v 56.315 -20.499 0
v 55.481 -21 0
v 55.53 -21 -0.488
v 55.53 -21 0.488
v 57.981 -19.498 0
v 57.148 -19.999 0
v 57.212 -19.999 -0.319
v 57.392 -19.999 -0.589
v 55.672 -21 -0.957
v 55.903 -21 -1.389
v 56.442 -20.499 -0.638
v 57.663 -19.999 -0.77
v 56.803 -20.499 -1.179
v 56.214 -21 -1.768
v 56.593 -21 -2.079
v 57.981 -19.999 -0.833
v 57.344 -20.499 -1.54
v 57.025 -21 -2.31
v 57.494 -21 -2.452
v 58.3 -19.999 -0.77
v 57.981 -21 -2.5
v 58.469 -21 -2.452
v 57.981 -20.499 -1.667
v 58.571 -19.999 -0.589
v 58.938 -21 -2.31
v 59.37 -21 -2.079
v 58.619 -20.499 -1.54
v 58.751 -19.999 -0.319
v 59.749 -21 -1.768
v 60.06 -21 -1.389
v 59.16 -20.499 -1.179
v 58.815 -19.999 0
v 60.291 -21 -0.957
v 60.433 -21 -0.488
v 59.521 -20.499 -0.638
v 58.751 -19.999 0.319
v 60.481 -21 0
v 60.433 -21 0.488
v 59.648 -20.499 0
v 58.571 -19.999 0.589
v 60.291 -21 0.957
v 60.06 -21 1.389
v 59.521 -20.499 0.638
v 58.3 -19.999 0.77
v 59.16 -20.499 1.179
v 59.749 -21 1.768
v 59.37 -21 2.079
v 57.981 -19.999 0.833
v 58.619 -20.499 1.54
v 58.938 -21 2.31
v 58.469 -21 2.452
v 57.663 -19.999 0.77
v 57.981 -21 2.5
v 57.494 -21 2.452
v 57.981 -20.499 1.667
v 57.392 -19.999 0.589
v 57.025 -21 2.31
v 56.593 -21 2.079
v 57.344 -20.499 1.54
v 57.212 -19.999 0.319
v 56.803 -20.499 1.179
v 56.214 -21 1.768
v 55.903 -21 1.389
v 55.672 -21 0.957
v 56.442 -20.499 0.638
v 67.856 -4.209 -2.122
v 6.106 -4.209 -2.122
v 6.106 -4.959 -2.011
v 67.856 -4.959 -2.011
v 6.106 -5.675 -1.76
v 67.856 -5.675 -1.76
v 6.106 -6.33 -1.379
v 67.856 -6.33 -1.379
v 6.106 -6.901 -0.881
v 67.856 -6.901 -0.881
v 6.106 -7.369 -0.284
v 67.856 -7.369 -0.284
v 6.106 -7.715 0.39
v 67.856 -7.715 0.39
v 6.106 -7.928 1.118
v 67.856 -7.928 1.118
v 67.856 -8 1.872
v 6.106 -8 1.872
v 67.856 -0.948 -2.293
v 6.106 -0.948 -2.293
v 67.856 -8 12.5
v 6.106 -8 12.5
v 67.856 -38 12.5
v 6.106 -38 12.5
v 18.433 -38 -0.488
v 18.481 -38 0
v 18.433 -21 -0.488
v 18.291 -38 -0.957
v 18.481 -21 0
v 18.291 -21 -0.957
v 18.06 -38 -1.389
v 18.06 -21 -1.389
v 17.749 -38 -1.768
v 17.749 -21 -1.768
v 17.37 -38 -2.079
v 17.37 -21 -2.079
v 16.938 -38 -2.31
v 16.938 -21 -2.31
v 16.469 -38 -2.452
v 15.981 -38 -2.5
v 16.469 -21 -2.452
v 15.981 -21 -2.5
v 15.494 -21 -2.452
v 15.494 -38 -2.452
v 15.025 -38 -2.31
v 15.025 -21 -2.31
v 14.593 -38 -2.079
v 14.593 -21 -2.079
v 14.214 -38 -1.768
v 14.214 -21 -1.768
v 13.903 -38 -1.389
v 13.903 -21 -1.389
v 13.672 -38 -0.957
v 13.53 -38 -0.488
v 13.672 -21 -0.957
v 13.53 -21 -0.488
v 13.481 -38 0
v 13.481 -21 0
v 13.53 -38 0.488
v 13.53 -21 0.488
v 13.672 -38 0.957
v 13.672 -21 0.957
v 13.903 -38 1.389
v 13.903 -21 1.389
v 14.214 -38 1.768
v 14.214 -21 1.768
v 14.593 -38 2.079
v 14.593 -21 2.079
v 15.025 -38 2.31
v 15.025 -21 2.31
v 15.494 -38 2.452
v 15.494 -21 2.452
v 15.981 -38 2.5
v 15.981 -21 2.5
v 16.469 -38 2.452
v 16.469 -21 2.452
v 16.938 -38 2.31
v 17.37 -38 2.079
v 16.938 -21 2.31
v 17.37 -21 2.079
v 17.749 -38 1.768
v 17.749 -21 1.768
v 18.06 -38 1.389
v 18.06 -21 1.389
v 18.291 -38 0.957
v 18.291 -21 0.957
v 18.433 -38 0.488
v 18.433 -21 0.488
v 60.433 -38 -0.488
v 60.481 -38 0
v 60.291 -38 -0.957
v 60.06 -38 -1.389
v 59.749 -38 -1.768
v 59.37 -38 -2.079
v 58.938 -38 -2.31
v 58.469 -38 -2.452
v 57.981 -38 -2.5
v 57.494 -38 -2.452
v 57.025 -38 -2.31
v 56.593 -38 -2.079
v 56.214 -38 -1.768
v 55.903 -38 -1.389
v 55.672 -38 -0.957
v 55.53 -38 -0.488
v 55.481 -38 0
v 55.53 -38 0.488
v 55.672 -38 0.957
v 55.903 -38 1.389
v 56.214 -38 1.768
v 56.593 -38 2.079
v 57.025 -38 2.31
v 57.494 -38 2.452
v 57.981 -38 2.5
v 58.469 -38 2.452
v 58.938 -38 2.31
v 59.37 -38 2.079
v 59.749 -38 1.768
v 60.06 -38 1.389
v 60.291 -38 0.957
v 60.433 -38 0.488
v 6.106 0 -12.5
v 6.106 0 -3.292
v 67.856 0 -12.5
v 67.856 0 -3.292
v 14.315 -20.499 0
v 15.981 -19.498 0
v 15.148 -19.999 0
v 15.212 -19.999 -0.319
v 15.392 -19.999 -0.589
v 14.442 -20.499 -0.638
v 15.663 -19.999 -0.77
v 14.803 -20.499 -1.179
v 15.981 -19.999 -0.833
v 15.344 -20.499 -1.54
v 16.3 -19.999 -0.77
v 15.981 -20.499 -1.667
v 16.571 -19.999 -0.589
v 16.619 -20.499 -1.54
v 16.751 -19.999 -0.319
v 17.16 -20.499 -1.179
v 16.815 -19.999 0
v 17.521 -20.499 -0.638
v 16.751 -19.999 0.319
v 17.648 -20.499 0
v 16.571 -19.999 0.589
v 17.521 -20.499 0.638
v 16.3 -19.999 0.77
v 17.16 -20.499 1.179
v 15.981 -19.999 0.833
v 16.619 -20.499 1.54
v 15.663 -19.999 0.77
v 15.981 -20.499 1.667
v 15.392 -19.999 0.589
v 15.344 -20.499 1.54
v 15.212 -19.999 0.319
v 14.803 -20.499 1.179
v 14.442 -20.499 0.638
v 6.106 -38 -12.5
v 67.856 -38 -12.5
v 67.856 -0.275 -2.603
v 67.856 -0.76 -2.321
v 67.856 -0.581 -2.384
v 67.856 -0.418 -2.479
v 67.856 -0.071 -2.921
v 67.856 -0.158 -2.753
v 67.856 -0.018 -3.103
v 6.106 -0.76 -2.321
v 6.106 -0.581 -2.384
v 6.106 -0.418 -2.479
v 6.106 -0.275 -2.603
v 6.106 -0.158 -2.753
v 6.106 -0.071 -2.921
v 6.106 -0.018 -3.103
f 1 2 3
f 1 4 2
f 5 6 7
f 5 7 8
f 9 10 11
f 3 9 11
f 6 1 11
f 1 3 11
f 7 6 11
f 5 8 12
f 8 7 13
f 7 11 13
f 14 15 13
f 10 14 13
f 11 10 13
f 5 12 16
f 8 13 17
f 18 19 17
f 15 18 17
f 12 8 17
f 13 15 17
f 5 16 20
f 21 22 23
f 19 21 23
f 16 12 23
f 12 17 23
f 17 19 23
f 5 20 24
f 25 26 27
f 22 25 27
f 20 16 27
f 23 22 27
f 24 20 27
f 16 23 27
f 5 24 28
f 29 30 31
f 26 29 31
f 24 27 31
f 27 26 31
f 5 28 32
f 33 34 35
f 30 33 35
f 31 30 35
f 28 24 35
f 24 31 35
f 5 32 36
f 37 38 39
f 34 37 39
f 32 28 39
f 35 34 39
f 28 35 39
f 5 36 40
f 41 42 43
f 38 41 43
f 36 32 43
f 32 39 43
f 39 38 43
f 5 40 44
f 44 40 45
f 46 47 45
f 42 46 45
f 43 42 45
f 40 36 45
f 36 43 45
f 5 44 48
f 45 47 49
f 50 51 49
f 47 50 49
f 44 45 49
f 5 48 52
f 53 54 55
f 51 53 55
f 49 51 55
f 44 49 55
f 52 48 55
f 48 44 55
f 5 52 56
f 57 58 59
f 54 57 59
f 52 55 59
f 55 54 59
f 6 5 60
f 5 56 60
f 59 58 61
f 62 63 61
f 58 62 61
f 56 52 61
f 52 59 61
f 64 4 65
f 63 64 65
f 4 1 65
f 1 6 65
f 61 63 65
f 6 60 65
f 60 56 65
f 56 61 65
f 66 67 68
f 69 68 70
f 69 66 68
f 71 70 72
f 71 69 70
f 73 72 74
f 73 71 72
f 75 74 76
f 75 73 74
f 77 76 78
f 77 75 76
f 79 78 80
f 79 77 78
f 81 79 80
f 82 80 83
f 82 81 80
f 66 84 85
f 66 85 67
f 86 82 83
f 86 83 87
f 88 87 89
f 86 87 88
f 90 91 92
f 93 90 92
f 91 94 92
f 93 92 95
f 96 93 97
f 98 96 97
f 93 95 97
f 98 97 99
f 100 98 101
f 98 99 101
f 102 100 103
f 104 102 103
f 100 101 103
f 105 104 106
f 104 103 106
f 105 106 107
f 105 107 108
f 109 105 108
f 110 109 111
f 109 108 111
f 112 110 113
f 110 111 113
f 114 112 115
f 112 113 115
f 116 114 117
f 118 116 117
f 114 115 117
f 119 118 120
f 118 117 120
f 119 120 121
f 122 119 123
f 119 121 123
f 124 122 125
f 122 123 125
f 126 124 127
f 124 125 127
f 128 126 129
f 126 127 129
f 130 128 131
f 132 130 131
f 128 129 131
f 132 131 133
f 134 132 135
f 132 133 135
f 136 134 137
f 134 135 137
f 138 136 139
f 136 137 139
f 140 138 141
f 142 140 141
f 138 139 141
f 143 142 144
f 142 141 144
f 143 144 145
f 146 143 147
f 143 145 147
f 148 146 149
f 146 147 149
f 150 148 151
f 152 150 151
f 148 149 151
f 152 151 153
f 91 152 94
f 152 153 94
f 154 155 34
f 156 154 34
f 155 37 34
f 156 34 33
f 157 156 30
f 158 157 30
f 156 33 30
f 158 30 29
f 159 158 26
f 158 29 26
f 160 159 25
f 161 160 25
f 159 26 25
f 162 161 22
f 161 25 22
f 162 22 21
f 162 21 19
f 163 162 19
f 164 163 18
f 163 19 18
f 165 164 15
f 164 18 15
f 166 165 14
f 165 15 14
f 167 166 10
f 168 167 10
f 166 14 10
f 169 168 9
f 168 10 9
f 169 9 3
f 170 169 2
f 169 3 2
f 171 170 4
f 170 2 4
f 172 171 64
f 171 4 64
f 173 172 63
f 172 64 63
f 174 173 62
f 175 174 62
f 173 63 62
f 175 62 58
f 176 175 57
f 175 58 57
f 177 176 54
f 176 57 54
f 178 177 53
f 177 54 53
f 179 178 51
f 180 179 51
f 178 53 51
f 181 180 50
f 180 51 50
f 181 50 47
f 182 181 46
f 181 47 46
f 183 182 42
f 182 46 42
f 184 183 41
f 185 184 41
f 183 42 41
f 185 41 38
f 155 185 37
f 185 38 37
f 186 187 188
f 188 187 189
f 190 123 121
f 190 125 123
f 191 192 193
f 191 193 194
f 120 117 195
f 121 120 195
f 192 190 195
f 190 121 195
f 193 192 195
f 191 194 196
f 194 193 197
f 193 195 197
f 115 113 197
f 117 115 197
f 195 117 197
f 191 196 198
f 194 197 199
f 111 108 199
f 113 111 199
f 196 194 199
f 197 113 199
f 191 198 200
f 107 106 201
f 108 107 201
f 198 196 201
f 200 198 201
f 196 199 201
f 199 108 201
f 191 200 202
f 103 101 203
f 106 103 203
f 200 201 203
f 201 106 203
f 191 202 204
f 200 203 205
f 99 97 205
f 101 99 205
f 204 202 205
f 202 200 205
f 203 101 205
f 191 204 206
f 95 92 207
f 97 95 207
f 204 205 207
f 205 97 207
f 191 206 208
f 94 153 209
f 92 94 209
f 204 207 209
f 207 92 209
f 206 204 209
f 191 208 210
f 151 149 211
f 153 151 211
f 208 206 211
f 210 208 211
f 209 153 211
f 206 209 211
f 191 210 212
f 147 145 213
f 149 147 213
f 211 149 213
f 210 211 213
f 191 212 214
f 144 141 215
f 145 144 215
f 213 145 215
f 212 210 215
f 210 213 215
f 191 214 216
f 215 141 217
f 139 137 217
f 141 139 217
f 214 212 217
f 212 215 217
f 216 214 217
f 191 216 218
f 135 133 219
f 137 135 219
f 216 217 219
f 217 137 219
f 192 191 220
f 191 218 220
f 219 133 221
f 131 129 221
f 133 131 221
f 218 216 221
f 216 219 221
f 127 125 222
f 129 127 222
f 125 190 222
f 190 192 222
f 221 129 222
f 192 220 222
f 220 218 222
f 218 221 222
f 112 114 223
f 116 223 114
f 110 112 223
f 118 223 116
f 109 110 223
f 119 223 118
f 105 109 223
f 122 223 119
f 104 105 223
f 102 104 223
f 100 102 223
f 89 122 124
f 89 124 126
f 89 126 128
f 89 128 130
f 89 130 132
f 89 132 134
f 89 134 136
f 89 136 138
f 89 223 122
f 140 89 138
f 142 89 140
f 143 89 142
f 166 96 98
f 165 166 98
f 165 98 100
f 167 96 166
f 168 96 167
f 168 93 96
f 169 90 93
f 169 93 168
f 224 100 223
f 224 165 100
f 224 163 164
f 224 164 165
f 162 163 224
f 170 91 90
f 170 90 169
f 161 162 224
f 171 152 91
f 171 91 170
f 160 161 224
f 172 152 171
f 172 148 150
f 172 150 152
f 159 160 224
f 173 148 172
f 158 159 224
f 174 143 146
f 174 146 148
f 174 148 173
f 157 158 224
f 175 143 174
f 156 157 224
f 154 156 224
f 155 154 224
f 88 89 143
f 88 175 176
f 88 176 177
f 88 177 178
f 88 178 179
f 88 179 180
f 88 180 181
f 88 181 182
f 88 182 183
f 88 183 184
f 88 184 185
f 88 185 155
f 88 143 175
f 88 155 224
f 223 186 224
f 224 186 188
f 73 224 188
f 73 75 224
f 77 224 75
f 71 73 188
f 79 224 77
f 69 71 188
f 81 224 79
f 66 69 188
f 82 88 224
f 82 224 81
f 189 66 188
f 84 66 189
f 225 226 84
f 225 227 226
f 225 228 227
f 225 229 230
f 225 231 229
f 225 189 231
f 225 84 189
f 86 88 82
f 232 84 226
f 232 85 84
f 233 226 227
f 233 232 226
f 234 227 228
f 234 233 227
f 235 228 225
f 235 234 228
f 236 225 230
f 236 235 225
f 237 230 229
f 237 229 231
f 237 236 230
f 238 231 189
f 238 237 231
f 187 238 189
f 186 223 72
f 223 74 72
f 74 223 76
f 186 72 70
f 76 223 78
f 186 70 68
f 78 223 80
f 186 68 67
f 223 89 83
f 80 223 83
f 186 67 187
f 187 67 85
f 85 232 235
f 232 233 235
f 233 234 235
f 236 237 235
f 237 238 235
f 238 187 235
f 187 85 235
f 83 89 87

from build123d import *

# Parameters (mm, degrees)
SKETCH1_W             = 61.75
SKETCH1_H             = 38
BOSS_EXTRUDE1_DEPTH   = 12.5
CUT_EXTRUDE1_REACH    = 75.575
FILLET1_R             = 1
M6_TAPPED_HOLE1_D     = 5
M6_TAPPED_HOLE1_DEPTH = 17
M6_TAPPED_HOLE1_TIP   = 1.502151548


with BuildPart() as part:
    # Sketch1 → Boss-Extrude1 (new, symmetric)
    with BuildSketch(Plane.XY):
        with Locations((36.981465557, -19)):
            Rectangle(SKETCH1_W, SKETCH1_H)
    extrude(amount=BOSS_EXTRUDE1_DEPTH, both=True)

    # Sketch2 → Cut-Extrude1 (cut, up to next)
    with BuildSketch(Plane(origin=(67.856465557, 0, 0), x_dir=(0, 0, -1), z_dir=(1, 0, 0)), mode=Mode.PRIVATE) as cut_extrude1_sk1:
        with BuildLine():
            Line((2.342754418, 0), (2.122152056, -4.209343825))
            ThreePointArc((2.122152056, -4.209343825), (0.88105222, -6.901497484), (-1.872366083, -8))
            Line((-1.872366083, -8), (-12.5, -8))
            Line((-12.5, -8), (-12.5, 0))
            Line((-12.5, 0), (2.342754418, 0))
        make_face()
    cut_extrude1_tool1 = extrude(cut_extrude1_sk1.sketch, amount=-CUT_EXTRUDE1_REACH, mode=Mode.PRIVATE) & part.part
    add(cut_extrude1_tool1.solids().sort_by_distance((67.856466, -3.896267, 5.35091))[0], mode=Mode.SUBTRACT)

    # Fillet1
    fillet1_edges = [part.edges().sort_by_distance(p)[0] for p in [
        (36.981465557, 0, -2.342754418),
    ]]
    fillet(fillet1_edges, radius=FILLET1_R)

    # M6 Tapped Hole1
    with Locations(Plane(origin=(0, -38, 0), x_dir=(-1, 0, 0), z_dir=(0, -1, 0))):
        with Locations((-57.981465557, 0), (-15.981465557, 0)):
            Hole(M6_TAPPED_HOLE1_D / 2, depth=M6_TAPPED_HOLE1_DEPTH)
            with Locations((0, 0, -(M6_TAPPED_HOLE1_DEPTH + M6_TAPPED_HOLE1_TIP / 2))):  # 118° drill point
                Cone(0, M6_TAPPED_HOLE1_D / 2, M6_TAPPED_HOLE1_TIP, mode=Mode.SUBTRACT)


solid = part.part
